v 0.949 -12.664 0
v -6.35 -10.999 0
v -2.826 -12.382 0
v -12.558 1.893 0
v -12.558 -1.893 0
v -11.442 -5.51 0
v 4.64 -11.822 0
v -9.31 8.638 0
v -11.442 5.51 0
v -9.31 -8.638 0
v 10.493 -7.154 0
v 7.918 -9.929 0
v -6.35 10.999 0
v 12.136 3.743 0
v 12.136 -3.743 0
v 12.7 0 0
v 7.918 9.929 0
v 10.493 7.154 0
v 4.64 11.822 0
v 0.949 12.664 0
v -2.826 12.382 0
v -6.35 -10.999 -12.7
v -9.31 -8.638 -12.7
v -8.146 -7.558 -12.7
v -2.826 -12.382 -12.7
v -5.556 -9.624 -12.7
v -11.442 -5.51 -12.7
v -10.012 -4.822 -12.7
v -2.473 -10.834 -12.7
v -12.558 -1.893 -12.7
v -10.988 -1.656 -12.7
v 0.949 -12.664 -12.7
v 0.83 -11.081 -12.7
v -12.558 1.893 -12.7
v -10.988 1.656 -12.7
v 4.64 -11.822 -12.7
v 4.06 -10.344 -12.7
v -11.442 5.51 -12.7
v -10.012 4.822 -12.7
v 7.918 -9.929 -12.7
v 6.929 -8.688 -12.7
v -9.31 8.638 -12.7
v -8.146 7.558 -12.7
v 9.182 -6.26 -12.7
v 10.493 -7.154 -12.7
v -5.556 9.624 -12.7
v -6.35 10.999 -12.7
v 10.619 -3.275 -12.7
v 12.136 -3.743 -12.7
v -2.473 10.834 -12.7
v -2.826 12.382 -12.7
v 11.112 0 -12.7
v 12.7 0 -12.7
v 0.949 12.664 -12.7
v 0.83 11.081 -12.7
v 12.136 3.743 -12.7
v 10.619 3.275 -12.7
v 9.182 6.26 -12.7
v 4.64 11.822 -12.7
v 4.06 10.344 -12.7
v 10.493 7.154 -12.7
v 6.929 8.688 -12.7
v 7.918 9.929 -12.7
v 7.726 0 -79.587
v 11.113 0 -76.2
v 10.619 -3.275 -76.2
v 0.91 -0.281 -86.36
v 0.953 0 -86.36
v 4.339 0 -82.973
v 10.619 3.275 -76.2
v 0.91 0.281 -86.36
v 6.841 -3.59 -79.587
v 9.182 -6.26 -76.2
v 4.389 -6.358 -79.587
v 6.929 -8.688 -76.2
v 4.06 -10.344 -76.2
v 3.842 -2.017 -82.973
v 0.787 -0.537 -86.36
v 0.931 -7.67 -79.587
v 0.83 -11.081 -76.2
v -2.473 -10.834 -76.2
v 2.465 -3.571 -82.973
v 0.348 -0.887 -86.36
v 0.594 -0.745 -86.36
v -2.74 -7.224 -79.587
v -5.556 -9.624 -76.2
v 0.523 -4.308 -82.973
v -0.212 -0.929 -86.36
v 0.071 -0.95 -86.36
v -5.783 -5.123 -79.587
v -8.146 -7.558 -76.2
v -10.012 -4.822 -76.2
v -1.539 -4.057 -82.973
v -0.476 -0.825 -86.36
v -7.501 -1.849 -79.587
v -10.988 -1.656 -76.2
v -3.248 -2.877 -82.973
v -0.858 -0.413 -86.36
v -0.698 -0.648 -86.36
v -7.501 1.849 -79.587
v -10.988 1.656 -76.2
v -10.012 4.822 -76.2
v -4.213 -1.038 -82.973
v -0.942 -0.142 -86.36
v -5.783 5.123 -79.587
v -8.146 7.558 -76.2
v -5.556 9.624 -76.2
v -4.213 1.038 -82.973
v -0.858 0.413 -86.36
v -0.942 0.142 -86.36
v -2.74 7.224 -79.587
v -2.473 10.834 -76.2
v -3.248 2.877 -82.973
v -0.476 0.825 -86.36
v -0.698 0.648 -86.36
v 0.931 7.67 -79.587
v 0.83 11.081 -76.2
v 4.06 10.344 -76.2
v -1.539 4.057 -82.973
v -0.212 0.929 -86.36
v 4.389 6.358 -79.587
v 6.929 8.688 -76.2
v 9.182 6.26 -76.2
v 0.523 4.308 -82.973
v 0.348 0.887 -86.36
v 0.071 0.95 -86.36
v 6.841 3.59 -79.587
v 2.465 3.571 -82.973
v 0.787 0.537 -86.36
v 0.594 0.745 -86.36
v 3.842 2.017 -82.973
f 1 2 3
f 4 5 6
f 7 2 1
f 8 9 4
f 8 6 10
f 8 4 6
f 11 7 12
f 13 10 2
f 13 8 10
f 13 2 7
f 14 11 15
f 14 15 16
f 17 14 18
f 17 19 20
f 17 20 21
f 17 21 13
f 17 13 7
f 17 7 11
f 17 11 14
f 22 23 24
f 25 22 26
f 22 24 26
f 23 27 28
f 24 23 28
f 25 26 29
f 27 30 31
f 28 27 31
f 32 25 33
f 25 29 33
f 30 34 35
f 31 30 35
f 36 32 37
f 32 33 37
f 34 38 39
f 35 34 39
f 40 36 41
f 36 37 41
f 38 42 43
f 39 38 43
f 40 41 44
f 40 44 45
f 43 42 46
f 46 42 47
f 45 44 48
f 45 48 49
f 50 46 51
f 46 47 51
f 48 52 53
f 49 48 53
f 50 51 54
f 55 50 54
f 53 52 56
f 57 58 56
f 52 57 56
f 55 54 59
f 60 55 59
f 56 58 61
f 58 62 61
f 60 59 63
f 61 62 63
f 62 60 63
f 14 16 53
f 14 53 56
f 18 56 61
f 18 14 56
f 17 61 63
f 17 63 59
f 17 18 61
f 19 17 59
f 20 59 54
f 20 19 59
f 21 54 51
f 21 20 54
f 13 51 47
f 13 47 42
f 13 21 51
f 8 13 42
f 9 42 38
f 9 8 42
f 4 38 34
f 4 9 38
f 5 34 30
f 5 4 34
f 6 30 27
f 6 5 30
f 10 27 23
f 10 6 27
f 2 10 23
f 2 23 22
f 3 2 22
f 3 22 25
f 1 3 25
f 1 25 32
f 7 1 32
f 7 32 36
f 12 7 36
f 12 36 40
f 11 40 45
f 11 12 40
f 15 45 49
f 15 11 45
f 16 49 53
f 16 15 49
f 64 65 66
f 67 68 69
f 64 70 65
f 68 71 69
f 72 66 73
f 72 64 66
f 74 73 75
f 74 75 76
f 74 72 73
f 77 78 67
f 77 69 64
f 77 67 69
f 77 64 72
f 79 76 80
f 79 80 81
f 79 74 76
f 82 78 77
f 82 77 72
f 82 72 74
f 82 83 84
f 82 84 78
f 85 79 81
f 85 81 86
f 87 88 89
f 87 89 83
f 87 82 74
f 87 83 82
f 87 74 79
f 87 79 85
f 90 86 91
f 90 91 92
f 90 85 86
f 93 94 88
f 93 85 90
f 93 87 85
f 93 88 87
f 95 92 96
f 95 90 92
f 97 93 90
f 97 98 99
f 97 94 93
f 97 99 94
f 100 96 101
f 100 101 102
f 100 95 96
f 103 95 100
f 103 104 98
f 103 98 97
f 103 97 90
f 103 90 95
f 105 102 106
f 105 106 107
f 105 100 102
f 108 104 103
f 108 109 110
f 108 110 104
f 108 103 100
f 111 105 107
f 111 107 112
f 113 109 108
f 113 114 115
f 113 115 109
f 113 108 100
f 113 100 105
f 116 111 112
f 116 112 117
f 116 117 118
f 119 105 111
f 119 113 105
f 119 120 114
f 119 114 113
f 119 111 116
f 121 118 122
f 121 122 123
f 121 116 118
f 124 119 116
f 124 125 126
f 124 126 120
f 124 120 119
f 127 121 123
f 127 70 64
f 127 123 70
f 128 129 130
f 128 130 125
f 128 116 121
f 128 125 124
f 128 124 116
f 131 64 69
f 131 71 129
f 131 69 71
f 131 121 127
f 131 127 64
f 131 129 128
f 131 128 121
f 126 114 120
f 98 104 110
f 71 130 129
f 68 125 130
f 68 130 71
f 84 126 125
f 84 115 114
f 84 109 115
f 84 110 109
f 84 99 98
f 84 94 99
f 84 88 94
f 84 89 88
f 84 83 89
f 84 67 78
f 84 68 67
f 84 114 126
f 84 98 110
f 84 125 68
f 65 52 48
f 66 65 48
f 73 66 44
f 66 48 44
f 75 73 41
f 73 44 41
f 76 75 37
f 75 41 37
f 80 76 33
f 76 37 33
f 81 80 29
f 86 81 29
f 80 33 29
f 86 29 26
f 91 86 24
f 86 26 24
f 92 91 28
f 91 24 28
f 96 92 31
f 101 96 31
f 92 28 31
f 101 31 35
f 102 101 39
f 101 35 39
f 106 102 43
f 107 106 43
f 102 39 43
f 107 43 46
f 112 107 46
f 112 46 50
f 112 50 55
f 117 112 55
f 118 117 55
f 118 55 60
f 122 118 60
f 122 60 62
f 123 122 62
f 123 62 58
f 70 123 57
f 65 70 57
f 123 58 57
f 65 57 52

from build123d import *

# Parameters (mm, degrees)
F0_R     = 12.7
F1_DEPTH = 12.7
F2_R     = 11.1125
F3_DEPTH = 63.5
F4_R     = 11.1125
F5_DEPTH = 10.16
F5_TAPER = 45


with BuildPart() as f1:
    # F0 (on Top) → F1 (new body)
    with BuildSketch(Plane.XY):
        Circle(F0_R)
    extrude(amount=-F1_DEPTH)

    # F2 (on face) → F3 (join)
    with BuildSketch(Plane(origin=(0, 0, -12.7), x_dir=(1, 0, 0), z_dir=(0, 0, -1))):
        Circle(F2_R)
    extrude(amount=F3_DEPTH)

    # F4 (on face) → F5 (join)
    with BuildSketch(Plane(origin=(0, 0, -76.2), x_dir=(1, 0, 0), z_dir=(0, 0, -1))):
        Circle(F4_R)
    extrude(amount=F5_DEPTH, taper=F5_TAPER)


solid = f1.part
